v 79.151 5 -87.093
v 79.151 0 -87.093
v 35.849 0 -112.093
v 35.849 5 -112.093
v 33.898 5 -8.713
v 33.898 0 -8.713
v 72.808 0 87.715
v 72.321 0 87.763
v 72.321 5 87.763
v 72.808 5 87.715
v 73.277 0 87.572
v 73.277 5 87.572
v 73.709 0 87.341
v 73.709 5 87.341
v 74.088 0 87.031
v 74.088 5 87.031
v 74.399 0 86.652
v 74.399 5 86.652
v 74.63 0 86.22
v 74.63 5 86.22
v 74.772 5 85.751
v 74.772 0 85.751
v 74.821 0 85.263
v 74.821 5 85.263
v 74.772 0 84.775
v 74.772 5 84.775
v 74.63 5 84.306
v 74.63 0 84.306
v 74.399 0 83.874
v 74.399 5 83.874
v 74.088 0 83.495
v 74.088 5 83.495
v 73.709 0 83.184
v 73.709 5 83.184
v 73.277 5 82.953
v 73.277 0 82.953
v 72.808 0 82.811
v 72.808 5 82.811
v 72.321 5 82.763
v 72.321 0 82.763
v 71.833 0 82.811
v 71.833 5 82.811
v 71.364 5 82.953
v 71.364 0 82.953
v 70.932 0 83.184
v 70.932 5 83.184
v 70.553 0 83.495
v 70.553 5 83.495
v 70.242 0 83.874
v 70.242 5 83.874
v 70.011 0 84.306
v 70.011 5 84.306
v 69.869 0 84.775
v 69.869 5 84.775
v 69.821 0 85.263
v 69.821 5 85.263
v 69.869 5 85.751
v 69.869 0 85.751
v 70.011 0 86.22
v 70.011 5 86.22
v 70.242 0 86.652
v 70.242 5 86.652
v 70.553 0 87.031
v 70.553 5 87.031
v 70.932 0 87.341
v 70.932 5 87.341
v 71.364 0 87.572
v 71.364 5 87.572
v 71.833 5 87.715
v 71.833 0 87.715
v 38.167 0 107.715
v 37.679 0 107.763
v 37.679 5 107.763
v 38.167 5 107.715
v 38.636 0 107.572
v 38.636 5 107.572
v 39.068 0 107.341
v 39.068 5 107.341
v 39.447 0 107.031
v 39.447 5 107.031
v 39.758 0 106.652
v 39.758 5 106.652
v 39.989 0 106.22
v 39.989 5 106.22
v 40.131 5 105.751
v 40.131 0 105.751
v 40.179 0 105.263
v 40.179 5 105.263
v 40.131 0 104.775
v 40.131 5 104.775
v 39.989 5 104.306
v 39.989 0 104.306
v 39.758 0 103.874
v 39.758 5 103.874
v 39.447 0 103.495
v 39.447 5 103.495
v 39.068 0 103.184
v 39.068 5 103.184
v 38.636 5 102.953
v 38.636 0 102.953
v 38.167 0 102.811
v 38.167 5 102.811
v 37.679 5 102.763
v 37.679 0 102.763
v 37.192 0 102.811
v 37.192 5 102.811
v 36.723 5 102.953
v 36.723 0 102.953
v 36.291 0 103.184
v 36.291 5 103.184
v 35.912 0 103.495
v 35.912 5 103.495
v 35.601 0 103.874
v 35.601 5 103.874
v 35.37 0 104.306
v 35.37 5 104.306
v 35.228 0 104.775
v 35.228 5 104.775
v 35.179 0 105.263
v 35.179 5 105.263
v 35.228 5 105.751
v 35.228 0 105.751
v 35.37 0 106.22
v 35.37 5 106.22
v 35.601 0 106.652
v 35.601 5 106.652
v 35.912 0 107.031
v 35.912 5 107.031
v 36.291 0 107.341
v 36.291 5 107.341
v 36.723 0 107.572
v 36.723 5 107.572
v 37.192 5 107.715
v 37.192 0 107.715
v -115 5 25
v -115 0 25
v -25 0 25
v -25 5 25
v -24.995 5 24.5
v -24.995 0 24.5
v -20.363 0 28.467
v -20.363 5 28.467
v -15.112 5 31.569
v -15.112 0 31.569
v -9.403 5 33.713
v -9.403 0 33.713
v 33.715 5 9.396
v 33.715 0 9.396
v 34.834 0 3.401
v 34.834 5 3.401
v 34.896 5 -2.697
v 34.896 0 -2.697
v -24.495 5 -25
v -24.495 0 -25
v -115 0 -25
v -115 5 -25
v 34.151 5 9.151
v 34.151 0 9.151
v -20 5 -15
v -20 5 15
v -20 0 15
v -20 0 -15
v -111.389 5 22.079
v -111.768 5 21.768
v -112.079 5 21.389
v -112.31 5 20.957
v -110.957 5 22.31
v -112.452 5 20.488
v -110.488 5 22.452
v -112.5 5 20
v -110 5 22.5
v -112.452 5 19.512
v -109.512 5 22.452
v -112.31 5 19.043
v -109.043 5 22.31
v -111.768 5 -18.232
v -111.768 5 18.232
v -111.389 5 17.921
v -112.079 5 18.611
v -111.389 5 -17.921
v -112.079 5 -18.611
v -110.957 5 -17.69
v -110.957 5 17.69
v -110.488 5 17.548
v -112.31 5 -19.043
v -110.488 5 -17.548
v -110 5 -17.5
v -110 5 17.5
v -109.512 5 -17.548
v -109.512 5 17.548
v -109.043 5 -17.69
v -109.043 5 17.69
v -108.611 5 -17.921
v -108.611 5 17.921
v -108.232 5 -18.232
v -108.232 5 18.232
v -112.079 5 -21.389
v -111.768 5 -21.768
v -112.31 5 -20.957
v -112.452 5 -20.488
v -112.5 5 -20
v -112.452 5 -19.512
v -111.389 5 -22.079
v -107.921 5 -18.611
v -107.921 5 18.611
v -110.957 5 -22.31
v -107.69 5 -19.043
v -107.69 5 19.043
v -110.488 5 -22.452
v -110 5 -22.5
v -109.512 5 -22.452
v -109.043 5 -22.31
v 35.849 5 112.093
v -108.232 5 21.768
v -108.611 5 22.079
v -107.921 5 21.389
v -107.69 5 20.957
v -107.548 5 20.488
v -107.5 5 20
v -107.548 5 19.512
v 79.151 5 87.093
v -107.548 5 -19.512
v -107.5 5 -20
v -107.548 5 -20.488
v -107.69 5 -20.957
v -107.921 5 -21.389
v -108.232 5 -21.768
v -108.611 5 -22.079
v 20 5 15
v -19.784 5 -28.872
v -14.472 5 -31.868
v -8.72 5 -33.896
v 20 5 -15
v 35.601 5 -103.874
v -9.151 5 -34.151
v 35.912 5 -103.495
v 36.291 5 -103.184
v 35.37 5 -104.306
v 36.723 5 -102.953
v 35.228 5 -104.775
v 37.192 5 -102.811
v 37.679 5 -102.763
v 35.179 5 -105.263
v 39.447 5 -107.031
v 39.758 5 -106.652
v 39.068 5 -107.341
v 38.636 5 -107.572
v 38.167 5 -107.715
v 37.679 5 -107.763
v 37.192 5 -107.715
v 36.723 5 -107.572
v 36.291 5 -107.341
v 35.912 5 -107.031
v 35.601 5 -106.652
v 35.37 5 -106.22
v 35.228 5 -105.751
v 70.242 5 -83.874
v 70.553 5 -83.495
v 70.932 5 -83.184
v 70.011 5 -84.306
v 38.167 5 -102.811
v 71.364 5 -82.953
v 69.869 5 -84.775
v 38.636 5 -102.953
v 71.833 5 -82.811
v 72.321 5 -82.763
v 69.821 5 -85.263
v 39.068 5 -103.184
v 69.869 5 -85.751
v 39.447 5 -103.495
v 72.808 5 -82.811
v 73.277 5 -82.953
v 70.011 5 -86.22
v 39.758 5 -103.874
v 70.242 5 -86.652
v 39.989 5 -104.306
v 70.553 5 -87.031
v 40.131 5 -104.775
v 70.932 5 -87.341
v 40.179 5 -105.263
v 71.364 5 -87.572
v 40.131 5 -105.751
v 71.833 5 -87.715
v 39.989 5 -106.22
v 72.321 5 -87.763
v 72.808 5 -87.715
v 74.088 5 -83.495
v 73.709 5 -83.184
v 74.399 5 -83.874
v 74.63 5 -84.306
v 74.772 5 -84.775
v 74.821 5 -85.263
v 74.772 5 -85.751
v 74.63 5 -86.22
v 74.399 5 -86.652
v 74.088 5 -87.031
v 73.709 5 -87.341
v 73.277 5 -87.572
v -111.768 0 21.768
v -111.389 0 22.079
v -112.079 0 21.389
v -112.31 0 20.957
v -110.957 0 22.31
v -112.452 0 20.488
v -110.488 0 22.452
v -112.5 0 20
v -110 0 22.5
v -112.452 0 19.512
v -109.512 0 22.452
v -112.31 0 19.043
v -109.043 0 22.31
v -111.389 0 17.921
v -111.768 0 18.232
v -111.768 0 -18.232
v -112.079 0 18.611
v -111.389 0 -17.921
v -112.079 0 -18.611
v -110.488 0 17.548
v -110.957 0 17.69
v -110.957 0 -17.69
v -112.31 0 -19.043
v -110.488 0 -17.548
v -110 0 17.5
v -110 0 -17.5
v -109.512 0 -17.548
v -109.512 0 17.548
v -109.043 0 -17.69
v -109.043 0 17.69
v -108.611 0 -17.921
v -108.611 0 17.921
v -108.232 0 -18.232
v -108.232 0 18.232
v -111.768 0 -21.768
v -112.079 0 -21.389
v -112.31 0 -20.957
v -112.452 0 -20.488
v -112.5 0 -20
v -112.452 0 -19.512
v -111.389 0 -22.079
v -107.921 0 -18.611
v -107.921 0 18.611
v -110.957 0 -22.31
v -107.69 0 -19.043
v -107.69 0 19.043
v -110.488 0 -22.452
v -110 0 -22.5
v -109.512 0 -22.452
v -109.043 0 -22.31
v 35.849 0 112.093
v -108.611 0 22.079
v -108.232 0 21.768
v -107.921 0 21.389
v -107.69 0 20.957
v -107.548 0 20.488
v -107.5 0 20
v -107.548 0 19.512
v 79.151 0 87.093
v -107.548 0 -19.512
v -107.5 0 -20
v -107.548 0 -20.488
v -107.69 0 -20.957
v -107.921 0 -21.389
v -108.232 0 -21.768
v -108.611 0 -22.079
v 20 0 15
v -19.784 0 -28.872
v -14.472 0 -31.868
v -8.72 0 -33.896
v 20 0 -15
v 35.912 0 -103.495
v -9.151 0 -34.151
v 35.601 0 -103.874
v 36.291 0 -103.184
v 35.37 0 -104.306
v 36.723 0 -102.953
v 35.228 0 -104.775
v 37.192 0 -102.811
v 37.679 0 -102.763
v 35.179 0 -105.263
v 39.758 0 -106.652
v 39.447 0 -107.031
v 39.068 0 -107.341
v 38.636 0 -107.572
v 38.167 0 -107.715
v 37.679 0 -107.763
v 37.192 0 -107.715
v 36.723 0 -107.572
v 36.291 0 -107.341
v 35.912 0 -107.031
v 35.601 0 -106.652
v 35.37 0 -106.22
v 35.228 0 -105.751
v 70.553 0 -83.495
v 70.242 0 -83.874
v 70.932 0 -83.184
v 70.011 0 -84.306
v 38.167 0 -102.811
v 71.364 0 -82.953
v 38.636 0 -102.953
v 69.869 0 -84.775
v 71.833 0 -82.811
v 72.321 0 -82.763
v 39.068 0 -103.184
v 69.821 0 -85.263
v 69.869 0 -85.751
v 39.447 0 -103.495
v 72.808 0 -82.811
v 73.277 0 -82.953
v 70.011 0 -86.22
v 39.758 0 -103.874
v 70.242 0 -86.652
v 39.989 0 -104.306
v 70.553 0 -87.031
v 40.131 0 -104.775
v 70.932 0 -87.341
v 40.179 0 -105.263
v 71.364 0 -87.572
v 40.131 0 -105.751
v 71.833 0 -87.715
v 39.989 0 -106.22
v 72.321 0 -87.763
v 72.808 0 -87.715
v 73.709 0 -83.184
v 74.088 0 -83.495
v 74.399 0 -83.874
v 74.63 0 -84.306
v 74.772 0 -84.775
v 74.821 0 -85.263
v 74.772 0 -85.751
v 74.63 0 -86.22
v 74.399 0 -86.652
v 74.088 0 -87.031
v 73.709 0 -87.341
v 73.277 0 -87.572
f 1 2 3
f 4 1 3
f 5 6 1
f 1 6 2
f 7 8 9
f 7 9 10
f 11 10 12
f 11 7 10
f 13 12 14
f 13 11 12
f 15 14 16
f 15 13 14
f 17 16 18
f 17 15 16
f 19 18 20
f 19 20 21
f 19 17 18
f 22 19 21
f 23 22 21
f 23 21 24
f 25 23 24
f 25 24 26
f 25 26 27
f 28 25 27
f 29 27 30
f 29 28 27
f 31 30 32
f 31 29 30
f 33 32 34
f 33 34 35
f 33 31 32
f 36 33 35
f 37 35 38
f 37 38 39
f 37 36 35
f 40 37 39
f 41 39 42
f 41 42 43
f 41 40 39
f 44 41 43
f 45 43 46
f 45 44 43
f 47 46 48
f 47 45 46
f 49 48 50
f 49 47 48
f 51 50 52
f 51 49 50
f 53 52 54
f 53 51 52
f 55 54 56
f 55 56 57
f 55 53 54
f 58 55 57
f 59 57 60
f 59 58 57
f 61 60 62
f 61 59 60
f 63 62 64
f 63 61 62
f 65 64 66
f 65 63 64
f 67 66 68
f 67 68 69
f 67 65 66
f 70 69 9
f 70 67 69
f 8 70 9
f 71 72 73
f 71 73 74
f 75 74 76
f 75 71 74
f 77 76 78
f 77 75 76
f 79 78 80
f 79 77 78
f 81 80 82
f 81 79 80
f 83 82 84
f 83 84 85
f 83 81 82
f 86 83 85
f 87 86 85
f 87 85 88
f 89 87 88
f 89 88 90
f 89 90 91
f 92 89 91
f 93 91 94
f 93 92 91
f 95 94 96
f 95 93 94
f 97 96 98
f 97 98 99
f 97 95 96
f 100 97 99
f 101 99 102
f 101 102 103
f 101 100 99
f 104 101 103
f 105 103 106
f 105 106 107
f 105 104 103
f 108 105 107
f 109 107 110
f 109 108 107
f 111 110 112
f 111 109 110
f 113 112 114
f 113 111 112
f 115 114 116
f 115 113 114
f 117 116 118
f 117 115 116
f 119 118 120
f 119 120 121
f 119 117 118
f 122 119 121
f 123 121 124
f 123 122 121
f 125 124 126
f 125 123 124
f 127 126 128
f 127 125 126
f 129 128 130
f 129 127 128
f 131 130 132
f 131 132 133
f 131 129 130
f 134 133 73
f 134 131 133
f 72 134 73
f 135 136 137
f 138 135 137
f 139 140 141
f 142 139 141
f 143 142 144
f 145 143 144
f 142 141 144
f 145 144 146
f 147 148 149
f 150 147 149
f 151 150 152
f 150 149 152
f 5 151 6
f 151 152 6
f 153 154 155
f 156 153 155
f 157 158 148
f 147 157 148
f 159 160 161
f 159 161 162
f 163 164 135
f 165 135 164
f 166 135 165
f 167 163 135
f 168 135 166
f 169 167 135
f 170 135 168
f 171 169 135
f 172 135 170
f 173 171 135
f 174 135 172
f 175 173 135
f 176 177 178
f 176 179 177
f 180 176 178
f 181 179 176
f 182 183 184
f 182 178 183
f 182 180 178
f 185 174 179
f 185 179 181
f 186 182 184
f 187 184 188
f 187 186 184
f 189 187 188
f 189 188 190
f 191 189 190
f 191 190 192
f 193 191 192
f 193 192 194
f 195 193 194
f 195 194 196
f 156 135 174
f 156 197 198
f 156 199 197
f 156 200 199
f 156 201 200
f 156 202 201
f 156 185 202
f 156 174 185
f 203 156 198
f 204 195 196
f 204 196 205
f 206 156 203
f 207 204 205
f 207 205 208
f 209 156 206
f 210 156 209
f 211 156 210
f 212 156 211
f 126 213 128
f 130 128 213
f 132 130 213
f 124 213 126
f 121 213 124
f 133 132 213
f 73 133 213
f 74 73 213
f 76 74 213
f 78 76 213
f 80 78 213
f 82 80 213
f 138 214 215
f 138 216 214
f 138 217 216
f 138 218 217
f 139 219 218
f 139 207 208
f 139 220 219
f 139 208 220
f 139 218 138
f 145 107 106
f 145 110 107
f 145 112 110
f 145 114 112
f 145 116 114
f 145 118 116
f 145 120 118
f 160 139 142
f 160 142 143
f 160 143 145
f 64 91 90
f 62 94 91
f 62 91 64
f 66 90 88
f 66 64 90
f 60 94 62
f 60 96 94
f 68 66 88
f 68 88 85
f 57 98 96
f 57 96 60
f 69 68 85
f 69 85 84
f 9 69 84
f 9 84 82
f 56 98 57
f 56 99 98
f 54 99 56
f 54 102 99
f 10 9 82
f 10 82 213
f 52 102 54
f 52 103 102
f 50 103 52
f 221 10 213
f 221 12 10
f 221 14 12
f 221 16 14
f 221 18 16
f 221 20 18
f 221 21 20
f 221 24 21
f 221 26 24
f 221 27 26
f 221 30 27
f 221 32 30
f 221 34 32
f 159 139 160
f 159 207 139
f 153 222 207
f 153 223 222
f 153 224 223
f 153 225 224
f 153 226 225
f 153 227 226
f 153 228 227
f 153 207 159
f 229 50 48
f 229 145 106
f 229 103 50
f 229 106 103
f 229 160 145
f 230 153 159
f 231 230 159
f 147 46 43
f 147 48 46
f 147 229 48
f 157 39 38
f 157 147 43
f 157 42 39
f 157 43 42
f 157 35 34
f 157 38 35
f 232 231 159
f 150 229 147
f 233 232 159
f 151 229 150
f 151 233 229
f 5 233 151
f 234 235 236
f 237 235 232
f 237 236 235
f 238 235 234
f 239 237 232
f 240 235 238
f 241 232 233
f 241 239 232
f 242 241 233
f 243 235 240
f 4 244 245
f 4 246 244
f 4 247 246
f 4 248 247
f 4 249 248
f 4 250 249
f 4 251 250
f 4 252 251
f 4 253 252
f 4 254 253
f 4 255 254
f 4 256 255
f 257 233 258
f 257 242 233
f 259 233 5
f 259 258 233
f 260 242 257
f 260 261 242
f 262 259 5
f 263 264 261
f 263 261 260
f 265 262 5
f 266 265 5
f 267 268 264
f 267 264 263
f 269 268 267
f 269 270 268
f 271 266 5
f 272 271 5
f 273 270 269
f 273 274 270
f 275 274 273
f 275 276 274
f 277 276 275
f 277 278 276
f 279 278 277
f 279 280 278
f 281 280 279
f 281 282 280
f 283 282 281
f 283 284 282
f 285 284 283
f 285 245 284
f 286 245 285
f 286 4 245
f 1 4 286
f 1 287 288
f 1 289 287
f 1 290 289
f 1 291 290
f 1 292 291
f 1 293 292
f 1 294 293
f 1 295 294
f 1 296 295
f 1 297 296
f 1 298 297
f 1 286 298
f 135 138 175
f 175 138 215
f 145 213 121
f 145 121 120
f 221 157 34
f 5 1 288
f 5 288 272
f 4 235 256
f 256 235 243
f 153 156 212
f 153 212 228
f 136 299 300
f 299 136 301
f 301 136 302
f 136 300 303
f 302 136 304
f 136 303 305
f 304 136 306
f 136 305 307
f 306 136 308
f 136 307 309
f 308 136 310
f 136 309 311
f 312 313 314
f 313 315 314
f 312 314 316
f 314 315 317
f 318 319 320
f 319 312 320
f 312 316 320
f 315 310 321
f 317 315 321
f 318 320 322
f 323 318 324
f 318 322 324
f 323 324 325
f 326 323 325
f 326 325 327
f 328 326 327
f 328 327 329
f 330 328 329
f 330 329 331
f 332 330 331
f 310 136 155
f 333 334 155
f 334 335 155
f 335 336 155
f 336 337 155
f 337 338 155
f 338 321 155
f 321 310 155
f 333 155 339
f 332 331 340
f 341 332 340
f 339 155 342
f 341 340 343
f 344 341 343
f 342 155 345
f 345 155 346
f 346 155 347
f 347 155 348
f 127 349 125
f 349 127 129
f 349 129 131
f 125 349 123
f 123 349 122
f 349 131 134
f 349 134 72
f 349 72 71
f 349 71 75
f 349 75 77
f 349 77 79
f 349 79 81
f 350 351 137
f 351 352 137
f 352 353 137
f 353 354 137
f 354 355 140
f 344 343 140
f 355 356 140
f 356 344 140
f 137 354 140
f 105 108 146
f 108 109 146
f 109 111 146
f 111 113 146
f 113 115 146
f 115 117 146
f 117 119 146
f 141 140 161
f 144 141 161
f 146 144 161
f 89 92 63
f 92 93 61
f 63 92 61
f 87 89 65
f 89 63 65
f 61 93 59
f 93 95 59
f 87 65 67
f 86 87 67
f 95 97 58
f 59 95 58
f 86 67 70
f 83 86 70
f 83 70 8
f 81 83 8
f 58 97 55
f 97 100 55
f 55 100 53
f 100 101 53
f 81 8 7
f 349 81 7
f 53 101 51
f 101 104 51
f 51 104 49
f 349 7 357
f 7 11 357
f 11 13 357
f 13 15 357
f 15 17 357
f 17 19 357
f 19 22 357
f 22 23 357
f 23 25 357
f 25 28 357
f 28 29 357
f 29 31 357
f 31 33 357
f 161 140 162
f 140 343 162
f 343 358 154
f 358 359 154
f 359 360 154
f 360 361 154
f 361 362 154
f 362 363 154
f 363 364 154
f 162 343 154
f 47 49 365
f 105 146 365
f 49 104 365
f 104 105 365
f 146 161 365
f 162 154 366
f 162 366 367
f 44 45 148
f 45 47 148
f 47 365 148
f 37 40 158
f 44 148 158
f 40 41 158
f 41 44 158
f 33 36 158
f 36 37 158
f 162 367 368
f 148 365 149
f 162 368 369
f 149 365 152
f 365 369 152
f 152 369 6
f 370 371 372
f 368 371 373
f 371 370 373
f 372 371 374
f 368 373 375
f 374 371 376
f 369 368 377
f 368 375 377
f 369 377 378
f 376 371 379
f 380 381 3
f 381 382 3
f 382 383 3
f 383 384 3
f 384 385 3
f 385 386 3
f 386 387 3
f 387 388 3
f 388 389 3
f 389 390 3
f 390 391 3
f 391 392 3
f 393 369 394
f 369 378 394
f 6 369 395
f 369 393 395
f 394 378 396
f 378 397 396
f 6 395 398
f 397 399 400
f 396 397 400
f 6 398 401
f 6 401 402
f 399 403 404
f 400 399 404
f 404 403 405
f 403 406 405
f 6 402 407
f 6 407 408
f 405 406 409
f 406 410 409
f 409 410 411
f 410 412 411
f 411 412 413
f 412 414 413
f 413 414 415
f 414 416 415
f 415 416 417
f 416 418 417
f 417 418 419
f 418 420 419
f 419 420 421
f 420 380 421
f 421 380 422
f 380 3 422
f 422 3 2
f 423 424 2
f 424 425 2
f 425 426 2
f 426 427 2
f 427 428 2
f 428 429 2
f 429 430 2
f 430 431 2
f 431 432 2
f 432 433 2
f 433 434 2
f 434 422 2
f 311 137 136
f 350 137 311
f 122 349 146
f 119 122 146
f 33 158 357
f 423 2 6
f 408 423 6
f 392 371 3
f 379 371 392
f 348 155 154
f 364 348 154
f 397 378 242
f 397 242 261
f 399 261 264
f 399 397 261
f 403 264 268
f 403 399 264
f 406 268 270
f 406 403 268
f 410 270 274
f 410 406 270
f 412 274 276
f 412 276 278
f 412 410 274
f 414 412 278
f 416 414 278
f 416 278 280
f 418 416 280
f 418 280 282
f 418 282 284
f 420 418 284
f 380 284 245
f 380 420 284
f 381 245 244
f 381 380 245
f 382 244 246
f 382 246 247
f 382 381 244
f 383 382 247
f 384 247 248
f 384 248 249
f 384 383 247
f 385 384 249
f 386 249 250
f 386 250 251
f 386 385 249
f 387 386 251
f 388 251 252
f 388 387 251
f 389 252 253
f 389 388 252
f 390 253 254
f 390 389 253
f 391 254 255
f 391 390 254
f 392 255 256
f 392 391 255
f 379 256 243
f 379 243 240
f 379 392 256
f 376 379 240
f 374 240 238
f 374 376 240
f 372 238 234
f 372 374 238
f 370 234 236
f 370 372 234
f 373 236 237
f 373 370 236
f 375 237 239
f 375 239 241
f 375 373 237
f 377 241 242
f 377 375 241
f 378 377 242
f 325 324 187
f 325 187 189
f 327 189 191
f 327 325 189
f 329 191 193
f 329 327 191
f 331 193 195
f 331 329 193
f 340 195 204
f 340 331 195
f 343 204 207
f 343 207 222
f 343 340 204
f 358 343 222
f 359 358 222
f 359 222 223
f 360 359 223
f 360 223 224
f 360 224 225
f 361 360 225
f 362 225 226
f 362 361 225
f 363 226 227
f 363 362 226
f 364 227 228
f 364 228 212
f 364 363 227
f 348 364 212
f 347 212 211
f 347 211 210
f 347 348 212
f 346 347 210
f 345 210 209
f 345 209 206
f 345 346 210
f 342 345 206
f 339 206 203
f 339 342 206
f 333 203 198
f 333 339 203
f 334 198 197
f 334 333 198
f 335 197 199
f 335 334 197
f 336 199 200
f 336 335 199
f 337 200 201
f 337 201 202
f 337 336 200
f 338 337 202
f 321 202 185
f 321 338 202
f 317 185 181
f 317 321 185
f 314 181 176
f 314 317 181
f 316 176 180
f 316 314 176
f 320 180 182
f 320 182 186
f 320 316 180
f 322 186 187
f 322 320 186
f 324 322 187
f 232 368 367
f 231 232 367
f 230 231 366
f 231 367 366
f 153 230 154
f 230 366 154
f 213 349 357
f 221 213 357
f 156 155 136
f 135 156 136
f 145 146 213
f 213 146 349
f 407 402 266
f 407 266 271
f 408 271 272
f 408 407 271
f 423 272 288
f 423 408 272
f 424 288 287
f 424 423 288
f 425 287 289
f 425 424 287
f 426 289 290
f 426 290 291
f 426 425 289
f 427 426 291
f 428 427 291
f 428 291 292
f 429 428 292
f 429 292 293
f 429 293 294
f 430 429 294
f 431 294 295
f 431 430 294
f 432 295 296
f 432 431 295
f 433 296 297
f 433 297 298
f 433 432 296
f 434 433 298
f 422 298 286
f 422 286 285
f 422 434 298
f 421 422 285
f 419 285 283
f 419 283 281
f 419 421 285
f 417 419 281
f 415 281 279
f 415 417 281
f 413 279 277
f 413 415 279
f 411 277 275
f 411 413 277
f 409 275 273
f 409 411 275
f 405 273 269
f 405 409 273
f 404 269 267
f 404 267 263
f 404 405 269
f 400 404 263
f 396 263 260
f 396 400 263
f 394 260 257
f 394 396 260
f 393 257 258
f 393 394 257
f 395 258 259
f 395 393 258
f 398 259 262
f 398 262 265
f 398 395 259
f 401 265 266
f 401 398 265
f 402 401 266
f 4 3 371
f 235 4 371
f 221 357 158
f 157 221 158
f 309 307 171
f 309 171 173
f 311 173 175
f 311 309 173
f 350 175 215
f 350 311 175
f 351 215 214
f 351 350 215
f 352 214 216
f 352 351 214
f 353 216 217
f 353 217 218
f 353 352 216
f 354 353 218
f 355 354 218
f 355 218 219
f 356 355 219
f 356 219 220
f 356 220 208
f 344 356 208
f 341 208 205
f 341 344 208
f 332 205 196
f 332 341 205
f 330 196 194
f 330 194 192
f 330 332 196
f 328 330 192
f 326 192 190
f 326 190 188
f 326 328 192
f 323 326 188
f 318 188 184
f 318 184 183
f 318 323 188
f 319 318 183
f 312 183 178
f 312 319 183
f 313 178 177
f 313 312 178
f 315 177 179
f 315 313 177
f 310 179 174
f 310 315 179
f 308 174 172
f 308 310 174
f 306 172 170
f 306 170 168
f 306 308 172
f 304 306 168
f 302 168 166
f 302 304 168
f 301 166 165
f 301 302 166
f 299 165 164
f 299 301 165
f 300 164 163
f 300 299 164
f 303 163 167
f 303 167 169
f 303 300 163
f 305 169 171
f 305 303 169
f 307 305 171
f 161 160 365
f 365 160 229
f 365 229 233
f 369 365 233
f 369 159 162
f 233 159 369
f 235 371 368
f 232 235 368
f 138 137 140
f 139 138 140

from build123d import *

# Parameters (mm, degrees)
ESQUISSE3_R             = 2.5
BOSS_EXTRU_3_DEPTH      = 5
ESQUISSE4_W             = 40
ESQUISSE4_H             = 30
ENL_V_MAT_EXTRU_1_DEPTH = 161.669919512


with BuildPart() as part:
    # Esquisse3 → Boss.-Extru.3 (new body)
    with BuildSketch(Plane(origin=(0, 0, 0), x_dir=(1, 0, 0), z_dir=(0, 1, 0))):
        with BuildLine():
            Line((-115, -25), (-25, -25))
            Line((-25, -25), (-24.99494949, -24.500051021))
            ThreePointArc((-24.99494949, -24.500051021), (-17.805293657, -30.132565736), (-9.403186381, -33.713203436))
            Line((-9.403186381, -33.713203436), (35.849364905, -112.092921435))
            Line((35.849364905, -112.092921435), (79.150635095, -87.092921435))
            Line((79.150635095, -87.092921435), (34.150635095, -9.150635095))
            Line((34.150635095, -9.150635095), (33.715141323, -9.396235714))
            ThreePointArc((33.715141323, -9.396235714), (34.998214236, -0.353553761), (33.898083809, 8.713203436))
            Line((33.898083809, 8.713203436), (79.150635095, 87.092921435))
            Line((79.150635095, 87.092921435), (35.849364905, 112.092921435))
            Line((35.849364905, 112.092921435), (-9.150635095, 34.150635095))
            Line((-9.150635095, 34.150635095), (-8.720191833, 33.896286735))
            ThreePointArc((-8.720191833, 33.896286735), (-17.19292058, 30.486119496), (-24.494897428, 25))
            Line((-24.494897428, 25), (-115, 25))
            Line((-115, 25), (-115, -25))
        make_face()
        with Locations(Location((-110, -20, 0), (0, 0, 270))):
            Circle(ESQUISSE3_R, mode=Mode.SUBTRACT)
        with Locations(Location((-110, 20, 0), (0, 0, 270))):
            Circle(ESQUISSE3_R, mode=Mode.SUBTRACT)
        with Locations(Location((72.320508076, -85.262794416, 0), (0, 0, 270))):
            Circle(ESQUISSE3_R, mode=Mode.SUBTRACT)
        with Locations(Location((37.679491924, -105.262794416, 0), (0, 0, 270))):
            Circle(ESQUISSE3_R, mode=Mode.SUBTRACT)
        with Locations(Location((72.320508076, 85.262794416, 0), (0, 0, 270))):
            Circle(ESQUISSE3_R, mode=Mode.SUBTRACT)
        with Locations(Location((37.679491924, 105.262794416, 0), (0, 0, 270))):
            Circle(ESQUISSE3_R, mode=Mode.SUBTRACT)
    extrude(amount=BOSS_EXTRU_3_DEPTH)

    # Esquisse4 → Enlèv. mat.-Extru.1 (cut, through all)
    with BuildSketch(Plane(origin=(0, 5, 0), x_dir=(1, 0, 0), z_dir=(0, 1, 0))):
        Rectangle(ESQUISSE4_W, ESQUISSE4_H)
    extrude(amount=-ENL_V_MAT_EXTRU_1_DEPTH, mode=Mode.SUBTRACT)


solid = part.part
